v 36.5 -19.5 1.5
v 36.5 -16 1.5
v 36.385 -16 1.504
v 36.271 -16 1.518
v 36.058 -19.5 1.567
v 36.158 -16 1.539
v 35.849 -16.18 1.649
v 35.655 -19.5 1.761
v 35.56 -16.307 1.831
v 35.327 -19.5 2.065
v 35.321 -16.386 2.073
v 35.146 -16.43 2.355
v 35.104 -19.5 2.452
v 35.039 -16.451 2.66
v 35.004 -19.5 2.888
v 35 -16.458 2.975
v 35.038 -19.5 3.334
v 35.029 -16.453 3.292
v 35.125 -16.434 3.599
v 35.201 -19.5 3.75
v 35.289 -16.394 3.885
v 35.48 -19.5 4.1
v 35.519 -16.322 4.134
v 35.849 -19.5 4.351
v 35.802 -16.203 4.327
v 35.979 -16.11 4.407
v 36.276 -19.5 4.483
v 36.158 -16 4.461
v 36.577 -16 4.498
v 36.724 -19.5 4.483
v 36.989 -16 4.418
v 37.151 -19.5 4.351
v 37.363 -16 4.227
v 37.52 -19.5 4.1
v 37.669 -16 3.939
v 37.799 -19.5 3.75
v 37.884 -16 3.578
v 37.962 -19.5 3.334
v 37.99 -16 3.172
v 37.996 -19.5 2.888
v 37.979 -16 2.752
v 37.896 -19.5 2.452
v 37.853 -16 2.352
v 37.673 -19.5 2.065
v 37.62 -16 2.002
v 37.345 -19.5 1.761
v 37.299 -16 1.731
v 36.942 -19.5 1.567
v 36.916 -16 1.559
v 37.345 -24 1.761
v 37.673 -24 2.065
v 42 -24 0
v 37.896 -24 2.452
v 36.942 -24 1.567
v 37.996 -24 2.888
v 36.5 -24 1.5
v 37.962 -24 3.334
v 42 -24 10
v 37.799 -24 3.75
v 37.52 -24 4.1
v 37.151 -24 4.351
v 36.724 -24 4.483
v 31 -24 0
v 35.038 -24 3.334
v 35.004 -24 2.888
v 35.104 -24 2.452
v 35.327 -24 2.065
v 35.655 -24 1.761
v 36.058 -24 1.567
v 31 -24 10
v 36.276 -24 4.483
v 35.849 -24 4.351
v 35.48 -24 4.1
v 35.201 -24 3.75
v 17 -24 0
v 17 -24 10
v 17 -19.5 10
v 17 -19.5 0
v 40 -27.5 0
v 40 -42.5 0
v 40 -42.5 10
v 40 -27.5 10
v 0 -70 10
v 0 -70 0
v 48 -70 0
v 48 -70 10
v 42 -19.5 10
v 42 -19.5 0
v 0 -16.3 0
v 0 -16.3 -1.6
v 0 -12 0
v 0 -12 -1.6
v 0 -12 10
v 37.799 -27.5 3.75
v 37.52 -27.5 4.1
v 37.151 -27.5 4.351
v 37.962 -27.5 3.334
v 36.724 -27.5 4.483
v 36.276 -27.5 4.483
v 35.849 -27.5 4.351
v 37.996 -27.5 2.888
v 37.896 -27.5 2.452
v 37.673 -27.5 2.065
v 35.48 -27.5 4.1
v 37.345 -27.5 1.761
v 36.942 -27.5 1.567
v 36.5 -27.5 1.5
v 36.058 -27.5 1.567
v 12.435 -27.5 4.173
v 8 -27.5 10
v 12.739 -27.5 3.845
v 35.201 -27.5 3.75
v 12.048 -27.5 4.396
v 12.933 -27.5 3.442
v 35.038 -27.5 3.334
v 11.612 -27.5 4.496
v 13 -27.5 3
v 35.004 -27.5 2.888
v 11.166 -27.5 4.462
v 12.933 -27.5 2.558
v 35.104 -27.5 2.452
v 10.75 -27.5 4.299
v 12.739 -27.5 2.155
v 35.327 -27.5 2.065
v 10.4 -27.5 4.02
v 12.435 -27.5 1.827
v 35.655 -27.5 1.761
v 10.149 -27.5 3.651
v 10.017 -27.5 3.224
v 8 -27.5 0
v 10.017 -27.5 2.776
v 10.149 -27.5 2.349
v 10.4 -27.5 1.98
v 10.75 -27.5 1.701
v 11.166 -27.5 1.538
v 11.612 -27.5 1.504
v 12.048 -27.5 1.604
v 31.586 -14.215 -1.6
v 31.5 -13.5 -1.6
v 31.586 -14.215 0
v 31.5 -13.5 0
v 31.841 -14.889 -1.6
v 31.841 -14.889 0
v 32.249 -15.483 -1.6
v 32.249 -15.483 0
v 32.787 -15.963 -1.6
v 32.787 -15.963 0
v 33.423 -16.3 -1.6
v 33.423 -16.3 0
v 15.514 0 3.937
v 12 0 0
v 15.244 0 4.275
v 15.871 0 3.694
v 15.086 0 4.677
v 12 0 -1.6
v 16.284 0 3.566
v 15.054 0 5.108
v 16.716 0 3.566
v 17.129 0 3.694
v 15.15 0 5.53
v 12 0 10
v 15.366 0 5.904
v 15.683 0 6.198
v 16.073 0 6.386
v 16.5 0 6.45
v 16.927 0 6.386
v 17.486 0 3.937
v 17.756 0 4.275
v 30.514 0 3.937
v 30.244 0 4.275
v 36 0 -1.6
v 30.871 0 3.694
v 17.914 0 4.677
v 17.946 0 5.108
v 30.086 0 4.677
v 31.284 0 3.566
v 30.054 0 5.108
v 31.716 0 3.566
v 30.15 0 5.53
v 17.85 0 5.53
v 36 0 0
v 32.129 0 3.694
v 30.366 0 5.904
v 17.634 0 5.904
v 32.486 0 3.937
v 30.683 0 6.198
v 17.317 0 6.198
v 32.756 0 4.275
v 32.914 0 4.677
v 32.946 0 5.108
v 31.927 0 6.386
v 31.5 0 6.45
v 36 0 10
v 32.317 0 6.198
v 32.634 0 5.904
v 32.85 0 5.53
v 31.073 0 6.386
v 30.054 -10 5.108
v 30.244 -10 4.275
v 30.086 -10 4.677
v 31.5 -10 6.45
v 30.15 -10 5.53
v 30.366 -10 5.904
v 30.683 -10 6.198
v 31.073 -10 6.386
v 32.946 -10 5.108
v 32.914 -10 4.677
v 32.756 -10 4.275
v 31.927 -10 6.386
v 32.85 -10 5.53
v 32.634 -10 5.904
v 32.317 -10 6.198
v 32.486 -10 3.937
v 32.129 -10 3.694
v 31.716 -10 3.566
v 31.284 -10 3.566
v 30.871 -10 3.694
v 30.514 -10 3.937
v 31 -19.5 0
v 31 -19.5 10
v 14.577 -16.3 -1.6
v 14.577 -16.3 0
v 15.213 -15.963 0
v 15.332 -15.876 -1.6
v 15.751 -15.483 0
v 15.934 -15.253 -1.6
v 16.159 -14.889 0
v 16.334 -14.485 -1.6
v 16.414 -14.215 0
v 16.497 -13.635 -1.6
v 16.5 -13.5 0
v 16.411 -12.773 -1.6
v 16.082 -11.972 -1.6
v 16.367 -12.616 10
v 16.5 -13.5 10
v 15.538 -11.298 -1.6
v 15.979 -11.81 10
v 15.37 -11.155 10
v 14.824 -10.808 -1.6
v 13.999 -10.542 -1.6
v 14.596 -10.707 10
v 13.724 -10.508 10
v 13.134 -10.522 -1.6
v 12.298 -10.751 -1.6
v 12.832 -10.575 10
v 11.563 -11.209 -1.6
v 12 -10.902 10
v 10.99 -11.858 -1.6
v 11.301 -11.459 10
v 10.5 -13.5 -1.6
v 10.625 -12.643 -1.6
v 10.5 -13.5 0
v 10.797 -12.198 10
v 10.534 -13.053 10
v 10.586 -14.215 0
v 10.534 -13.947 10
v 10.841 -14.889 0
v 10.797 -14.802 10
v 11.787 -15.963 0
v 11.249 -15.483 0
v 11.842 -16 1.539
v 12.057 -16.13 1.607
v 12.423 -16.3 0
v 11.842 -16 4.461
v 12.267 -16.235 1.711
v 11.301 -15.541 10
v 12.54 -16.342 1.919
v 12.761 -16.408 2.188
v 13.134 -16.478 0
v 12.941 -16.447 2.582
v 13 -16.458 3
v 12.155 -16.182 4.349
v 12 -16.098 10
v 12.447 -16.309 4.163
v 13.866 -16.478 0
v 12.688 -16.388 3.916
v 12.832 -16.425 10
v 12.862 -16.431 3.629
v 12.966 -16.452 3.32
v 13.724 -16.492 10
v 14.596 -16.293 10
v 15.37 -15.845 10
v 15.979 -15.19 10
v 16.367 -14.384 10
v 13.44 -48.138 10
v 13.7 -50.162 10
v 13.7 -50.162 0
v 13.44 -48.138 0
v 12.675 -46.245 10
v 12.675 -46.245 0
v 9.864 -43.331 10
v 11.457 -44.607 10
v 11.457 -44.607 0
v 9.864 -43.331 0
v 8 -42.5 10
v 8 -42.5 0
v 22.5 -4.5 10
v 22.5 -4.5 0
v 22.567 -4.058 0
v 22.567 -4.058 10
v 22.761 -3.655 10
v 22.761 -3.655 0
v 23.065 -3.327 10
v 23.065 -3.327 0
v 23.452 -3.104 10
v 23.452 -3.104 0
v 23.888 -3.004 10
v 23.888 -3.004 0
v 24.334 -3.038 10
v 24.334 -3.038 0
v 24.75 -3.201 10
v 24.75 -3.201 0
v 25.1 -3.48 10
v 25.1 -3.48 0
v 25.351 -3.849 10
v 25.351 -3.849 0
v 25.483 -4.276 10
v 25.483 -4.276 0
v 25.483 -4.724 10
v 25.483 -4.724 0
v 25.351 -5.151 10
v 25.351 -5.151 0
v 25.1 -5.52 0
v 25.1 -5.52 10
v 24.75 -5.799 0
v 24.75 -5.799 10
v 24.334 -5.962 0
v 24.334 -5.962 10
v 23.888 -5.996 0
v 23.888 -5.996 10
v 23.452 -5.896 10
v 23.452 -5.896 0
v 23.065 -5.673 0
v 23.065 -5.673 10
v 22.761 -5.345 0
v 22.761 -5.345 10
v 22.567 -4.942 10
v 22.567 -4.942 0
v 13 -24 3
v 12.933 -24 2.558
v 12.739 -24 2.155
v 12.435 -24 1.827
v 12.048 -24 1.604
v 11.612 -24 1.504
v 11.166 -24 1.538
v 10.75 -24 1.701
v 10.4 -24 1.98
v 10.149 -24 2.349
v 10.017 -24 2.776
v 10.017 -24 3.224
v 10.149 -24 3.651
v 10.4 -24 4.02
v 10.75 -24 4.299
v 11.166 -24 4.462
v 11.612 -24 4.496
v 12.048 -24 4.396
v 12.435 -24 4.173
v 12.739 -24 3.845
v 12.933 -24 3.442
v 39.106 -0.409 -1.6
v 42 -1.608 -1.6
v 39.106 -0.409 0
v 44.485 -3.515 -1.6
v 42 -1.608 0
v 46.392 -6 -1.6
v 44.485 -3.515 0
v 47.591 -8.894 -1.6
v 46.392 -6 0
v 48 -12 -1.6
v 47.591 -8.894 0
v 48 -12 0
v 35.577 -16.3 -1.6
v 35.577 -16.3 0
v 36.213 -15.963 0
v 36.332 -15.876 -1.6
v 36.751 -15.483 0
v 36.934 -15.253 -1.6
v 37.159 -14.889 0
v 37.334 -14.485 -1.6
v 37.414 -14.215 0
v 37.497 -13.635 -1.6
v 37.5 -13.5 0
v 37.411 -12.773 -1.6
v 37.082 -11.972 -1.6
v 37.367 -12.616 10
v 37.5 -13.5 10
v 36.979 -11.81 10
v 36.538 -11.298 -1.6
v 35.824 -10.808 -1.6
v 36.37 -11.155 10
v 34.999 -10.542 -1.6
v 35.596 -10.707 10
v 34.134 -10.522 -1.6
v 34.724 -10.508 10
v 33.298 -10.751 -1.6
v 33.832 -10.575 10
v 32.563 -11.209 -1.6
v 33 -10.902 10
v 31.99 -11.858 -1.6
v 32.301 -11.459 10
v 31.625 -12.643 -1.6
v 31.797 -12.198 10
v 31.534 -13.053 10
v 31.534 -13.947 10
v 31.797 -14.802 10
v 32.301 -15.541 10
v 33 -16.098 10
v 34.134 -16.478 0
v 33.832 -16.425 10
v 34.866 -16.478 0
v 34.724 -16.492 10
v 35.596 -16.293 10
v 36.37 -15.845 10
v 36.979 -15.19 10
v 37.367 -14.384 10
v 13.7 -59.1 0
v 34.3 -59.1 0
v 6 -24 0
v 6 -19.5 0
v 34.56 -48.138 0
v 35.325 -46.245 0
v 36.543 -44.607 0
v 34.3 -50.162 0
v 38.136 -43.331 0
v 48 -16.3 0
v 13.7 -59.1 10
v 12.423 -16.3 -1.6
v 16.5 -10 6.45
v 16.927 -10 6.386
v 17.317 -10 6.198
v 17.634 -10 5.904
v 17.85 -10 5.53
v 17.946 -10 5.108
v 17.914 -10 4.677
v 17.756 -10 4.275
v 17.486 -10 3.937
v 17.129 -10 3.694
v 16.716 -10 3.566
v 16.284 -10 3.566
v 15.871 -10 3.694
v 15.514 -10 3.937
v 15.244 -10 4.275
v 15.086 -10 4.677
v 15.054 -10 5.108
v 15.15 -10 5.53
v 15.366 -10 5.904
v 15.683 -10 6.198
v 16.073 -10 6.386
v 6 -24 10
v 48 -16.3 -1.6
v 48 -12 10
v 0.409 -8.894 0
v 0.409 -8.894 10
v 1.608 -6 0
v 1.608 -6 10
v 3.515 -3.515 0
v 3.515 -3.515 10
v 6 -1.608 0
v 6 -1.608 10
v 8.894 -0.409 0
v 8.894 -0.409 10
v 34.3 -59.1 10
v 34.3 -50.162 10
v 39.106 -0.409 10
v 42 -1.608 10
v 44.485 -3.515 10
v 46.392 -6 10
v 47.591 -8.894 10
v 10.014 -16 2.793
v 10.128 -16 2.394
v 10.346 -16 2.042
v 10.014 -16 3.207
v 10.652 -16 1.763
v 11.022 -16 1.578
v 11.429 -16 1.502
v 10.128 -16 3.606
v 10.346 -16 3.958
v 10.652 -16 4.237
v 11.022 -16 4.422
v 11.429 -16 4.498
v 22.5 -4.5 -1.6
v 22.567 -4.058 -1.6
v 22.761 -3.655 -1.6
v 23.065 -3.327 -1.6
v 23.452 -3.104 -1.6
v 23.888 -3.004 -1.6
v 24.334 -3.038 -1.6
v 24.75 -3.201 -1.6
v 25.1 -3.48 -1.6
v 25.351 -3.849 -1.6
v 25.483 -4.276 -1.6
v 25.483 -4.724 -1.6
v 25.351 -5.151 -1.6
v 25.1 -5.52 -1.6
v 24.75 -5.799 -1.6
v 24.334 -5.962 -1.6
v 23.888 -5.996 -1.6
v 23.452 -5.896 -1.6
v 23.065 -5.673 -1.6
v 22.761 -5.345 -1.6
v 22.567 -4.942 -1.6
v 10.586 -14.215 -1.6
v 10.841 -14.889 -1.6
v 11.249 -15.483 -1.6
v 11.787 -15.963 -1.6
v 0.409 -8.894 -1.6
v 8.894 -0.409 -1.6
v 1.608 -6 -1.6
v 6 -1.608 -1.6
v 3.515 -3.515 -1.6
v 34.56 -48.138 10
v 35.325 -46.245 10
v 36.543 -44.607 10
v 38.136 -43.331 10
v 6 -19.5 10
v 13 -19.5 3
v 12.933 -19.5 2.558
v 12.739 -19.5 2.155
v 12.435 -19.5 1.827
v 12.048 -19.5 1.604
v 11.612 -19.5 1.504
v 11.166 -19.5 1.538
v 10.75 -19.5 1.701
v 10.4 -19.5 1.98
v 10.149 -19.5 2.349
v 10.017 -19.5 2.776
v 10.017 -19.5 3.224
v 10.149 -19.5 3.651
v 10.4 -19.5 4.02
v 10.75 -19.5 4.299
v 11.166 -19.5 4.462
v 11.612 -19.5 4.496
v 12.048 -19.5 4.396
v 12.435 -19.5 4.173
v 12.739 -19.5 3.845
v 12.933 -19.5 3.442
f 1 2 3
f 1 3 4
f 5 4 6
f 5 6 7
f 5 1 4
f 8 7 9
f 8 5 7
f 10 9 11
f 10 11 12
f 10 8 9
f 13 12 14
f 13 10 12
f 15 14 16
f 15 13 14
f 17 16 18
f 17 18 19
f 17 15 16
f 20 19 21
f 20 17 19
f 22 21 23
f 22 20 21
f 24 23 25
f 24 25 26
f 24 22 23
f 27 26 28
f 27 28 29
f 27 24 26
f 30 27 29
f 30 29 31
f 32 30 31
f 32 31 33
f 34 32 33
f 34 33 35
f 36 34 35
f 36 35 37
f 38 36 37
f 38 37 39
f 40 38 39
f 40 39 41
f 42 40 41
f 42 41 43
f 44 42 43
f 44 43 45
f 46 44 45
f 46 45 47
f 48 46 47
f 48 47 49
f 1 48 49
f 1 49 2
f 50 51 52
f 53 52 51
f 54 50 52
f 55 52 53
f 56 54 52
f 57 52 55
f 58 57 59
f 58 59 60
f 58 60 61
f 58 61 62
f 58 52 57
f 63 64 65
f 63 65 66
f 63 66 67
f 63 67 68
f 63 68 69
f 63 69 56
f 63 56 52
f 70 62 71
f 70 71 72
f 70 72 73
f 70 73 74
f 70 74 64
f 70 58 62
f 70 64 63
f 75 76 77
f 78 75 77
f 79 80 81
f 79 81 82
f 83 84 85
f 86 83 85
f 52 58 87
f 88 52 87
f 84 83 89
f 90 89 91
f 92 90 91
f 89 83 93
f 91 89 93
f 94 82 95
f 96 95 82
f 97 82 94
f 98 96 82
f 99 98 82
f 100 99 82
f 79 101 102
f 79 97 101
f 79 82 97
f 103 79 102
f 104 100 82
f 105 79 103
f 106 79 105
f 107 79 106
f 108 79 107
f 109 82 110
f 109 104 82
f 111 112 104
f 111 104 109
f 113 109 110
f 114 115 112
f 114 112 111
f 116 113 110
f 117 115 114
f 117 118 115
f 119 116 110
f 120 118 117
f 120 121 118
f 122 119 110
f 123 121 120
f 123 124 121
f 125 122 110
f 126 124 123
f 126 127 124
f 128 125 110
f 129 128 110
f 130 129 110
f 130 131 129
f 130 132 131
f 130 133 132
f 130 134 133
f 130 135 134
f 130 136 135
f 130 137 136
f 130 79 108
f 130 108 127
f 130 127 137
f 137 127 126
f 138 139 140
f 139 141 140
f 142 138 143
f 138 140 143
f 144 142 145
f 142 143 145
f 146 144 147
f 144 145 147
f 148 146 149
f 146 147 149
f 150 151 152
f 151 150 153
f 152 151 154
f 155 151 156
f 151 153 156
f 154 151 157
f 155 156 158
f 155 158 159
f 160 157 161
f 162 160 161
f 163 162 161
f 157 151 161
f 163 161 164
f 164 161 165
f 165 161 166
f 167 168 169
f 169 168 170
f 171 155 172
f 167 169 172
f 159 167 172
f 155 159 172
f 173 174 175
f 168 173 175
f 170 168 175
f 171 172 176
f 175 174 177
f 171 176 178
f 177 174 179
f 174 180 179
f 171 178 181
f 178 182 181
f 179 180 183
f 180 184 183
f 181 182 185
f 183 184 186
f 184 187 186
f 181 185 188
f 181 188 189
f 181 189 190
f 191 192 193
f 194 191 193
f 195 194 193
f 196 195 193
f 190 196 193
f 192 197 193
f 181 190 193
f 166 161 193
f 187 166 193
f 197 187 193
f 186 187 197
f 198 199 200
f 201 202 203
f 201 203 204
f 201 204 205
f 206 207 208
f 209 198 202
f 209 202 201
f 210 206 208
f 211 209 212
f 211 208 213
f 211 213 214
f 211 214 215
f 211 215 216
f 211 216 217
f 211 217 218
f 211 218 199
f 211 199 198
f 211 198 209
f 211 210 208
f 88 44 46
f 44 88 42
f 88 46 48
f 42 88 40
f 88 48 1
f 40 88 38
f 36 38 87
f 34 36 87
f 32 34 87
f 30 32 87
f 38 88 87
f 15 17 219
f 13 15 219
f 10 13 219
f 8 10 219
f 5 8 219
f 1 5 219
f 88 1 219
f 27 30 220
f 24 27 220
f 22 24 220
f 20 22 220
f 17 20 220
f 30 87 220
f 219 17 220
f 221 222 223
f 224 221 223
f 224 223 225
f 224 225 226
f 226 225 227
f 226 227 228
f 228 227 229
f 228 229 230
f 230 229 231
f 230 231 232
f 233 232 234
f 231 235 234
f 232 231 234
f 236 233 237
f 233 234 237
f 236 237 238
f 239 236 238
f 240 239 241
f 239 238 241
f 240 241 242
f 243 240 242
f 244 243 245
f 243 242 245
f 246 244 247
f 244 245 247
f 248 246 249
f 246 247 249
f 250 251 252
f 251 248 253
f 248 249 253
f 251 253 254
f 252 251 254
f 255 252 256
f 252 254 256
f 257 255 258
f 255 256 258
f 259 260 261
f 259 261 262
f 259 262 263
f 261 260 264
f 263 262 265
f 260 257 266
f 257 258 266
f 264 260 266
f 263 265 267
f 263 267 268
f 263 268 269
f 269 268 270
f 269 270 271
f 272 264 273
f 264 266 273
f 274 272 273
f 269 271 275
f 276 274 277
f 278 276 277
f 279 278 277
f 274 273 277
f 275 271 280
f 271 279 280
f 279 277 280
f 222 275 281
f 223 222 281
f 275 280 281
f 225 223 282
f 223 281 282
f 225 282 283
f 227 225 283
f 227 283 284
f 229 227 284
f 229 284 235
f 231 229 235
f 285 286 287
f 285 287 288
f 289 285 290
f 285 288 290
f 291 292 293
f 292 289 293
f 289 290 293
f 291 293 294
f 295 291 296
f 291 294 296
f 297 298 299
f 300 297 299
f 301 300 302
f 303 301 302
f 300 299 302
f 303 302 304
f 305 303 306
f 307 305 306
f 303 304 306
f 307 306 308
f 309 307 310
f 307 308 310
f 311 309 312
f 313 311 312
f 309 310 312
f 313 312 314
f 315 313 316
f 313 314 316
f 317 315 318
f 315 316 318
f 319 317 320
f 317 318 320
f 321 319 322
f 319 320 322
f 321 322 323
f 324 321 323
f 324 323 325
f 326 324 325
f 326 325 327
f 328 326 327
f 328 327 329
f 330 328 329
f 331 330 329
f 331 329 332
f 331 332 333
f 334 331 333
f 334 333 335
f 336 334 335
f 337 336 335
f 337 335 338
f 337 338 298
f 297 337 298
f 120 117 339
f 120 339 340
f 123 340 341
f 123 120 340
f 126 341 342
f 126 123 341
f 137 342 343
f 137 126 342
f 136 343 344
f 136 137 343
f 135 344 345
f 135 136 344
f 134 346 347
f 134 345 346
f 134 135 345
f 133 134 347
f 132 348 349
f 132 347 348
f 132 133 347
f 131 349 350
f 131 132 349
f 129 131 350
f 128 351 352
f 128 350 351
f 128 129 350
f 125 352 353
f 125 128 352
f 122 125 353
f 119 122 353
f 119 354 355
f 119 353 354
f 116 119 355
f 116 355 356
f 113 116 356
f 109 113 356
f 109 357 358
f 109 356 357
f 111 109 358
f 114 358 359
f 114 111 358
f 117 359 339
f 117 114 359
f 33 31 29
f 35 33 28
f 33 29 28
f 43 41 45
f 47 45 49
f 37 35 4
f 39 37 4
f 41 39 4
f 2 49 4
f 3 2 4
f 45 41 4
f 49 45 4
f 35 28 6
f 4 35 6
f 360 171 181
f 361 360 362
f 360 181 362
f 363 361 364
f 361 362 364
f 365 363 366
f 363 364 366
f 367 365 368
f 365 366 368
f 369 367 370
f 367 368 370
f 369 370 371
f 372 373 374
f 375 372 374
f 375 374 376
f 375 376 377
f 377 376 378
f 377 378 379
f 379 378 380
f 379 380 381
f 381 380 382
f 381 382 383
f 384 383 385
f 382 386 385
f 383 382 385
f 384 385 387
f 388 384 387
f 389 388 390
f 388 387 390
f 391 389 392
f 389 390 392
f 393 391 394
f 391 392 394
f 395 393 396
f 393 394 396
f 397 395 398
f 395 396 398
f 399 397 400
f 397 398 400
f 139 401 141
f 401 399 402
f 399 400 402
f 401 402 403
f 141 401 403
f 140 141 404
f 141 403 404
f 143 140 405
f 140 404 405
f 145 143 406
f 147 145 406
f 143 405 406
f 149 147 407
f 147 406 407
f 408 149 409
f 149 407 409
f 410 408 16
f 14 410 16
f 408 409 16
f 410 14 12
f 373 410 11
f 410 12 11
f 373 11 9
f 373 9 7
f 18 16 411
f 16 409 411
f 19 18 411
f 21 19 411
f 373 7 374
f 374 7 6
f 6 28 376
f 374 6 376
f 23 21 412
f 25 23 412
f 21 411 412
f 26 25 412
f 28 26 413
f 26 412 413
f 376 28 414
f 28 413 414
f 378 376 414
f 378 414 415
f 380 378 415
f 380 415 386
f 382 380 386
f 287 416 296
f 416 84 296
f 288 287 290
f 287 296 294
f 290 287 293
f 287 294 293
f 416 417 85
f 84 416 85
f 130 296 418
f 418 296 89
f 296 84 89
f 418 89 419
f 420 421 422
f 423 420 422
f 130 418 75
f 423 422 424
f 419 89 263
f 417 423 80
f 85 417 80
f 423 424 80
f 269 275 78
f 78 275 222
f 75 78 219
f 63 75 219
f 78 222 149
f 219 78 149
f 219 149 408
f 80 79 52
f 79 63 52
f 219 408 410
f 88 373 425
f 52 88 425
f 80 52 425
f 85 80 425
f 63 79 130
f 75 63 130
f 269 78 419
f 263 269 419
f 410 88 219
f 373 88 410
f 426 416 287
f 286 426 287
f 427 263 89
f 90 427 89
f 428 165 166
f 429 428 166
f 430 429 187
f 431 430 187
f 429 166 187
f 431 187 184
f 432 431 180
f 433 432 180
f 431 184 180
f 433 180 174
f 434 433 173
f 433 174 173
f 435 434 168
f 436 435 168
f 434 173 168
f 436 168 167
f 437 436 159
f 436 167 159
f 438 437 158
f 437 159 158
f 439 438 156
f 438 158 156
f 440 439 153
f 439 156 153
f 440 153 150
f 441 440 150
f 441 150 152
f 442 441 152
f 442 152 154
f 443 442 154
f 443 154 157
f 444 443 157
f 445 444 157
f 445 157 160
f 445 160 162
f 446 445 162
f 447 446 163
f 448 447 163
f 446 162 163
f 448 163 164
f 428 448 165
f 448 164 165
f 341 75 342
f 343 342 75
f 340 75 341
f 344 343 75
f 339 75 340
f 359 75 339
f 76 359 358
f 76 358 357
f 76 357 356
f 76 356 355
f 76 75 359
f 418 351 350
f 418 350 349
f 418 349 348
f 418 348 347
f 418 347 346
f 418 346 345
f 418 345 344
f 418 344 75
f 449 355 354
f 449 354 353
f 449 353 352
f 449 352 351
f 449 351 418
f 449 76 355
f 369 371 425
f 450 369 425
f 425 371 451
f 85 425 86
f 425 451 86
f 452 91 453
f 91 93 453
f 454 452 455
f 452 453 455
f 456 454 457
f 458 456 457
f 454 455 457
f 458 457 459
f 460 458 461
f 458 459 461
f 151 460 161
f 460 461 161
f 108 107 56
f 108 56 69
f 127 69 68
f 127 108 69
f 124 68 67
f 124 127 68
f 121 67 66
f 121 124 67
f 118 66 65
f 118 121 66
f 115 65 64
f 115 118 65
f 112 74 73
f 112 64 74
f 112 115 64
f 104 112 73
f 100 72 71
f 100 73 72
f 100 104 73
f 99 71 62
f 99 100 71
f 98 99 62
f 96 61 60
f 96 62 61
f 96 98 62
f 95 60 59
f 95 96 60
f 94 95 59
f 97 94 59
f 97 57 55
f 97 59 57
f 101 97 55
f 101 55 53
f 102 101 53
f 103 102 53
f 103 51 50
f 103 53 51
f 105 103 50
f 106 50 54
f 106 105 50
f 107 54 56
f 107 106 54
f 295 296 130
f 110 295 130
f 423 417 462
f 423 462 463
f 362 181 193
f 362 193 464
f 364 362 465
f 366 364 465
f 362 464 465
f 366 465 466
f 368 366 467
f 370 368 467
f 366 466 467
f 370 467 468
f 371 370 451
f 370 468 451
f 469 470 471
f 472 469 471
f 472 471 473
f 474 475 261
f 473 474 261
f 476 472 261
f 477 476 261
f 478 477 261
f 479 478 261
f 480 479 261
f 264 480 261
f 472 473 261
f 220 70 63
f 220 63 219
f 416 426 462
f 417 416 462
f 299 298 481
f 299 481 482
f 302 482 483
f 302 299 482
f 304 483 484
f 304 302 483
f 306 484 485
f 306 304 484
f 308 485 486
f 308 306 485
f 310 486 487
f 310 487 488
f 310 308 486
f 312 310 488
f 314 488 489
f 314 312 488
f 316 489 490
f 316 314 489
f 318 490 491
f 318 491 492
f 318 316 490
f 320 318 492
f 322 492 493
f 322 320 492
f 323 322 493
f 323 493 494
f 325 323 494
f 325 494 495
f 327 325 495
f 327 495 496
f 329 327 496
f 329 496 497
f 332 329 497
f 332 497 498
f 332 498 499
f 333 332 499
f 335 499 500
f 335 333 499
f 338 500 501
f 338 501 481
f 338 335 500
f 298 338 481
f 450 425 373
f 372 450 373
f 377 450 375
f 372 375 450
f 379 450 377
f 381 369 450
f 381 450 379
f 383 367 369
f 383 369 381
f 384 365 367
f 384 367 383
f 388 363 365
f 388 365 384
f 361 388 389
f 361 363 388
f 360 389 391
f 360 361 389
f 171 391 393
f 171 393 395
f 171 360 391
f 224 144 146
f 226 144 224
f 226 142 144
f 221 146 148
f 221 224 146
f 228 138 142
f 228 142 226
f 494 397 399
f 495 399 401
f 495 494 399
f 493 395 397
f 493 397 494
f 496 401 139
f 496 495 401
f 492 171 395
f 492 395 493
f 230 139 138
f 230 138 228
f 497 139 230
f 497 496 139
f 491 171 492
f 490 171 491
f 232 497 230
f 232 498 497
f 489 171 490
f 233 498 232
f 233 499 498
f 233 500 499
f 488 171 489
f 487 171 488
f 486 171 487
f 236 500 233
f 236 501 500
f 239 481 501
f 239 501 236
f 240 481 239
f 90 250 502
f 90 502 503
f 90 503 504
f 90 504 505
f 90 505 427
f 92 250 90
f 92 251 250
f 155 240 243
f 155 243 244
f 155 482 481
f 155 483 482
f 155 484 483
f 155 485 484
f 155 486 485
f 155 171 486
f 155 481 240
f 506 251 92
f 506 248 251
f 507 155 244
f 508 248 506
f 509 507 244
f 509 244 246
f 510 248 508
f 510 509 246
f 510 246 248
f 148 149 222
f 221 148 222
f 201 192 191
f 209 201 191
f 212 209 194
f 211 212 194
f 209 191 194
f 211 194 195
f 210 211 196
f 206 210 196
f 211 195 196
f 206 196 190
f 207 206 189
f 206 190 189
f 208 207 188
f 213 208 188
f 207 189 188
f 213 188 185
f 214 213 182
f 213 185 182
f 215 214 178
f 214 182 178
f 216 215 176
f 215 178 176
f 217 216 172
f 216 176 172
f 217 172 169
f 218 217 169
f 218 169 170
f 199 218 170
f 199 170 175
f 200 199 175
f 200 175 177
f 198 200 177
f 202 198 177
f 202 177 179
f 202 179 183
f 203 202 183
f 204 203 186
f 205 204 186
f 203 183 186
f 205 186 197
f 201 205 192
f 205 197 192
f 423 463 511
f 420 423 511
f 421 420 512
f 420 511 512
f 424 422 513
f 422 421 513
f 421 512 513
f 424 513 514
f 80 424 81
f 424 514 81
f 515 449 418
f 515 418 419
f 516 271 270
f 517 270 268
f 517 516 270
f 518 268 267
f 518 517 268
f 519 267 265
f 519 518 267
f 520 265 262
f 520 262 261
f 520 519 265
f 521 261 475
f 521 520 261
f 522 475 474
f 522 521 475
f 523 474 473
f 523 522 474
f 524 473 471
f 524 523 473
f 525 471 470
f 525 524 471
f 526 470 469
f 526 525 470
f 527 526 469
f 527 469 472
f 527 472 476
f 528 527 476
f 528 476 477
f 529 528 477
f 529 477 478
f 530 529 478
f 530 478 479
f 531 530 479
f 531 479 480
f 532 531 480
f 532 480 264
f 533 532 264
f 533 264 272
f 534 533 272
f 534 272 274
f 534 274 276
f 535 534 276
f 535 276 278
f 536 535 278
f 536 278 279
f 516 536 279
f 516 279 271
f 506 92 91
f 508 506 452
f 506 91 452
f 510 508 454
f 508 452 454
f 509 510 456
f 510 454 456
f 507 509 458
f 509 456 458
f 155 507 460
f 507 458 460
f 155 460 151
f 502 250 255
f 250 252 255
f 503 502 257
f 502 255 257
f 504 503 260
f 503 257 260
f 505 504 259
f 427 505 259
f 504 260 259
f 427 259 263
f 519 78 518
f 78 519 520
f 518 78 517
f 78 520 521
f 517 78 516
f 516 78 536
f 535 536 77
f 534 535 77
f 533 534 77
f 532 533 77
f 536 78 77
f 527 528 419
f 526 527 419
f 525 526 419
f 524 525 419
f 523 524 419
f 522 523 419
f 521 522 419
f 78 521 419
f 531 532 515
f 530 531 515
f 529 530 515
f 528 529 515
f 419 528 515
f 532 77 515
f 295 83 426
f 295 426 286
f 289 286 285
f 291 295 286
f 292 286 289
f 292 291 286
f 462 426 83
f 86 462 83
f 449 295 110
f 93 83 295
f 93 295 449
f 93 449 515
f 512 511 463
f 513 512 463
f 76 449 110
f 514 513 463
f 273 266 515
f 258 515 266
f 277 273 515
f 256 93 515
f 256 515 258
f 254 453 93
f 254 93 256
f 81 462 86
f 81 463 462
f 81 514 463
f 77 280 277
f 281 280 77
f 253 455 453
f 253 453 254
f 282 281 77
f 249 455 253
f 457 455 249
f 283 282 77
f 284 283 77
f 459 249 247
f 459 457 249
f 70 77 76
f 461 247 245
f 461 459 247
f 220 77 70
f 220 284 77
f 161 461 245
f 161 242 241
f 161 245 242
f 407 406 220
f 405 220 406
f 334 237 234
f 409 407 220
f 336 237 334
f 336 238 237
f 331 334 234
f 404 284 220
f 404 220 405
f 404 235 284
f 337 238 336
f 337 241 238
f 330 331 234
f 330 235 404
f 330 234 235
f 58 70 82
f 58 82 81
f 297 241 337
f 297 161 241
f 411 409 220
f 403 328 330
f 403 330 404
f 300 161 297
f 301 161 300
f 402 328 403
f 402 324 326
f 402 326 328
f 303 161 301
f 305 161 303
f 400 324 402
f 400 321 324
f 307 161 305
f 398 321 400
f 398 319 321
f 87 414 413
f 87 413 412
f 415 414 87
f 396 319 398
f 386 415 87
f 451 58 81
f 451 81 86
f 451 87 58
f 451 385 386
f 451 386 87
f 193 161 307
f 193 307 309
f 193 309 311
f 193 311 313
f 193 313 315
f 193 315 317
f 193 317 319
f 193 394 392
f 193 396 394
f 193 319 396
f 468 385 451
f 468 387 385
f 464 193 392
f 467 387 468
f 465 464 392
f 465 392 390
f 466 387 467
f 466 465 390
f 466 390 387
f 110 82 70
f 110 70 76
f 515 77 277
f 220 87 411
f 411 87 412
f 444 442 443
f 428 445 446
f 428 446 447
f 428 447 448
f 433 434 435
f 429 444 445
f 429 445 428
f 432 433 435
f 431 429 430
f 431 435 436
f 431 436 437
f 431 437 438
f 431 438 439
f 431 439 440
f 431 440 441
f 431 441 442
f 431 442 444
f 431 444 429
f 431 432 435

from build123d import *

# Parameters (mm, degrees)
SKETCH1_W               = 48
SKETCH1_H               = 70
BOSS_EXTRUDE1_DEPTH     = 10
SKETCH2_R               = 3
CUT_EXTRUDE1_DEPTH      = 86.463442477
SKETCH3_W               = 20.6
SKETCH3_H               = 20.6
CUT_EXTRUDE2_DEPTH      = 86.463442477
FILLET1_R               = 12
SKETCH4_R               = 1.5
CUT_EXTRUDE3_DEPTH      = 86.463442477
SKETCH5_R               = 1.45
CUT_EXTRUDE4_DEPTH      = 10
CUT_EXTRUDE5_DEPTH      = 86.463442477
CUT_EXTRUDE5_DEPTH_BACK = 86.463442477
SKETCH7_W               = 11
SKETCH7_H               = 4.5
SKETCH11_W              = 32
SKETCH11_H              = 15
CUT_EXTRUDE6_DEPTH      = 86.463442477
CUT_EXTRUDE7_DEPTH      = 8
CUT_EXTRUDE7_DEPTH_BACK = 5
SKETCH12_R              = 1.5
SKETCH13_R              = 1.5
BOSS_EXTRUDE4_DEPTH     = 1.6
FILLET2_R               = 8


with BuildPart() as part:
    # Sketch1 → Boss-Extrude1 (new body)
    with BuildSketch(Plane.XY):
        with Locations((24, -35)):
            Rectangle(SKETCH1_W, SKETCH1_H)
    extrude(amount=BOSS_EXTRUDE1_DEPTH)

    # Sketch2 → Cut-Extrude1 (cut, through all)
    with BuildSketch(Plane.XY.offset(10)):
        with Locations((13.5, -13.5)):
            Circle(SKETCH2_R)
        with Locations((34.5, -13.5)):
            Circle(SKETCH2_R)
    extrude(amount=-CUT_EXTRUDE1_DEPTH, mode=Mode.SUBTRACT)

    # Sketch3 → Cut-Extrude2 (cut, through all)
    with BuildSketch(Plane.XY.offset(10)):
        with Locations((24, -48.8)):
            Rectangle(SKETCH3_W, SKETCH3_H)
    extrude(amount=-CUT_EXTRUDE2_DEPTH, mode=Mode.SUBTRACT)

    # Fillet1
    fillet1_edges = [part.edges().sort_by_distance(p)[0] for p in [
        (0, 0, 5),
        (48, 0, 5),
    ]]
    fillet(fillet1_edges, radius=FILLET1_R)

    # Sketch4 → Cut-Extrude3 (cut, through all)
    with BuildSketch(Plane(origin=(0, 0, 0), x_dir=(-1, 0, 0), z_dir=(0, 0, -1))):
        with Locations((-24, -4.5)):
            Circle(SKETCH4_R)
    extrude(amount=-CUT_EXTRUDE3_DEPTH, mode=Mode.SUBTRACT)

    # Sketch5 → Cut-Extrude4 (cut)
    with BuildSketch(Plane(origin=(0, 0, 0), x_dir=(1, 0, 0), z_dir=(0, 1, 0))):
        with Locations(Location((16.5, -5, 0), (0, 0, 270))):
            Circle(SKETCH5_R)
        with Locations(Location((31.5, -5, 0), (0, 0, 270))):
            Circle(SKETCH5_R)
    extrude(amount=-CUT_EXTRUDE4_DEPTH, mode=Mode.SUBTRACT)

    # Sketch7 → Cut-Extrude5 (cut, two sides: drawn at the far end of the back side and taken through both)
    with BuildSketch(Plane(origin=(0, 0, 0), x_dir=(-1, 0, 0), z_dir=(0, 0, -1)).offset(-CUT_EXTRUDE5_DEPTH_BACK)):
        with Locations((-36.5, -21.75)):
            Rectangle(SKETCH7_W, SKETCH7_H)
        with Locations((-11.5, -21.75)):
            Rectangle(SKETCH7_W, SKETCH7_H)
    extrude(amount=CUT_EXTRUDE5_DEPTH + CUT_EXTRUDE5_DEPTH_BACK, mode=Mode.SUBTRACT)

    # Sketch11 → Cut-Extrude6 (cut, through all)
    with BuildSketch(Plane(origin=(0, 0, 0), x_dir=(-1, 0, 0), z_dir=(0, 0, -1))):
        with Locations((-24, -35)):
            Rectangle(SKETCH11_W, SKETCH11_H)
    extrude(amount=-CUT_EXTRUDE6_DEPTH, mode=Mode.SUBTRACT)

    # Sketch12 → Cut-Extrude7 (cut, two sides: drawn at the far end of the back side and taken through both)
    with BuildSketch(Plane(origin=(0, -24, 0), x_dir=(1, 0, 0), z_dir=(0, 1, 0)).offset(-CUT_EXTRUDE7_DEPTH_BACK)):
        with Locations(Location((36.5, -3, 0), (0, 0, 90))):
            Circle(SKETCH12_R)
        with Locations((11.5, -3)):
            Circle(SKETCH12_R)
    extrude(amount=CUT_EXTRUDE7_DEPTH + CUT_EXTRUDE7_DEPTH_BACK, mode=Mode.SUBTRACT)

    # Sketch13 → Boss-Extrude4 (add)
    with BuildSketch(Plane(origin=(0, 0, 0), x_dir=(-1, 0, 0), z_dir=(0, 0, -1))):
        with BuildLine():
            Line((-48, -12), (-48, -16.3))
            Line((-48, -16.3), (-35.577032961, -16.3))
            ThreePointArc((-35.577032961, -16.3), (-36.198367027, -11.027036304), (-31.5, -13.5))
            ThreePointArc((-31.5, -13.5), (-32.027036304, -15.198367027), (-33.422967039, -16.3))
            Line((-33.422967039, -16.3), (-14.577032961, -16.3))
            ThreePointArc((-14.577032961, -16.3), (-15.198367027, -11.027036304), (-10.5, -13.5))
            ThreePointArc((-10.5, -13.5), (-11.027036304, -15.198367027), (-12.422967039, -16.3))
            Line((-12.422967039, -16.3), (0, -16.3))
            Line((0, -16.3), (0, -12))
            ThreePointArc((0, -12), (-3.514718626, -3.514718626), (-12, 0))
            Line((-12, 0), (-36, 0))
            ThreePointArc((-36, 0), (-44.485281374, -3.514718626), (-48, -12))
        make_face()
        with Locations((-24, -4.5)):
            Circle(SKETCH13_R, mode=Mode.SUBTRACT)
    extrude(amount=BOSS_EXTRUDE4_DEPTH)

    # Fillet2
    # the kernel refuses this fillet: 8 mm, written as the material it takes off along each edge
    with BuildSketch(Plane(origin=(13.7, -42.5, -19.155612754), x_dir=(-1, 0, 0), z_dir=(0, 0, 1))) as fillet2_piece_1:
        with BuildLine():
            CenterArc((8, 7.662245102), FILLET2_R, 180, 73.291656284)
            Line((0, 7.662245102), (-0.16, 7.662245102))
            Line((-0.16, 7.662245102), (-0.16, 0))
            Line((-0.16, 0), (0, -0.16))
            ThreePointArc((0, -0.16), (2.85, -0.16), (5.654, -0.153244902))
            Line((5.654, -0.153244902), (5.7, 0))
        make_face()
    extrude(amount=48.311225509, mode=Mode.SUBTRACT)
    with BuildSketch(Plane(origin=(34.3, -42.5, 29.155612754), x_dir=(0, -1, 0), z_dir=(0, 0, -1))) as fillet2_piece_2:
        with BuildLine():
            CenterArc((7.662245102, -8), FILLET2_R, 90, 73.291656284)
            Line((0, -5.7), (-0.153244902, -5.654))
            ThreePointArc((-0.153244902, -5.654), (-0.16, -2.85), (-0.16, 0))
            Line((-0.16, 0), (0, 0.16))
            Line((0, 0.16), (7.662245102, 0.16))
            Line((7.662245102, 0.16), (7.662245102, 0))
        make_face()
    extrude(amount=48.311225509, mode=Mode.SUBTRACT)


solid = part.part
